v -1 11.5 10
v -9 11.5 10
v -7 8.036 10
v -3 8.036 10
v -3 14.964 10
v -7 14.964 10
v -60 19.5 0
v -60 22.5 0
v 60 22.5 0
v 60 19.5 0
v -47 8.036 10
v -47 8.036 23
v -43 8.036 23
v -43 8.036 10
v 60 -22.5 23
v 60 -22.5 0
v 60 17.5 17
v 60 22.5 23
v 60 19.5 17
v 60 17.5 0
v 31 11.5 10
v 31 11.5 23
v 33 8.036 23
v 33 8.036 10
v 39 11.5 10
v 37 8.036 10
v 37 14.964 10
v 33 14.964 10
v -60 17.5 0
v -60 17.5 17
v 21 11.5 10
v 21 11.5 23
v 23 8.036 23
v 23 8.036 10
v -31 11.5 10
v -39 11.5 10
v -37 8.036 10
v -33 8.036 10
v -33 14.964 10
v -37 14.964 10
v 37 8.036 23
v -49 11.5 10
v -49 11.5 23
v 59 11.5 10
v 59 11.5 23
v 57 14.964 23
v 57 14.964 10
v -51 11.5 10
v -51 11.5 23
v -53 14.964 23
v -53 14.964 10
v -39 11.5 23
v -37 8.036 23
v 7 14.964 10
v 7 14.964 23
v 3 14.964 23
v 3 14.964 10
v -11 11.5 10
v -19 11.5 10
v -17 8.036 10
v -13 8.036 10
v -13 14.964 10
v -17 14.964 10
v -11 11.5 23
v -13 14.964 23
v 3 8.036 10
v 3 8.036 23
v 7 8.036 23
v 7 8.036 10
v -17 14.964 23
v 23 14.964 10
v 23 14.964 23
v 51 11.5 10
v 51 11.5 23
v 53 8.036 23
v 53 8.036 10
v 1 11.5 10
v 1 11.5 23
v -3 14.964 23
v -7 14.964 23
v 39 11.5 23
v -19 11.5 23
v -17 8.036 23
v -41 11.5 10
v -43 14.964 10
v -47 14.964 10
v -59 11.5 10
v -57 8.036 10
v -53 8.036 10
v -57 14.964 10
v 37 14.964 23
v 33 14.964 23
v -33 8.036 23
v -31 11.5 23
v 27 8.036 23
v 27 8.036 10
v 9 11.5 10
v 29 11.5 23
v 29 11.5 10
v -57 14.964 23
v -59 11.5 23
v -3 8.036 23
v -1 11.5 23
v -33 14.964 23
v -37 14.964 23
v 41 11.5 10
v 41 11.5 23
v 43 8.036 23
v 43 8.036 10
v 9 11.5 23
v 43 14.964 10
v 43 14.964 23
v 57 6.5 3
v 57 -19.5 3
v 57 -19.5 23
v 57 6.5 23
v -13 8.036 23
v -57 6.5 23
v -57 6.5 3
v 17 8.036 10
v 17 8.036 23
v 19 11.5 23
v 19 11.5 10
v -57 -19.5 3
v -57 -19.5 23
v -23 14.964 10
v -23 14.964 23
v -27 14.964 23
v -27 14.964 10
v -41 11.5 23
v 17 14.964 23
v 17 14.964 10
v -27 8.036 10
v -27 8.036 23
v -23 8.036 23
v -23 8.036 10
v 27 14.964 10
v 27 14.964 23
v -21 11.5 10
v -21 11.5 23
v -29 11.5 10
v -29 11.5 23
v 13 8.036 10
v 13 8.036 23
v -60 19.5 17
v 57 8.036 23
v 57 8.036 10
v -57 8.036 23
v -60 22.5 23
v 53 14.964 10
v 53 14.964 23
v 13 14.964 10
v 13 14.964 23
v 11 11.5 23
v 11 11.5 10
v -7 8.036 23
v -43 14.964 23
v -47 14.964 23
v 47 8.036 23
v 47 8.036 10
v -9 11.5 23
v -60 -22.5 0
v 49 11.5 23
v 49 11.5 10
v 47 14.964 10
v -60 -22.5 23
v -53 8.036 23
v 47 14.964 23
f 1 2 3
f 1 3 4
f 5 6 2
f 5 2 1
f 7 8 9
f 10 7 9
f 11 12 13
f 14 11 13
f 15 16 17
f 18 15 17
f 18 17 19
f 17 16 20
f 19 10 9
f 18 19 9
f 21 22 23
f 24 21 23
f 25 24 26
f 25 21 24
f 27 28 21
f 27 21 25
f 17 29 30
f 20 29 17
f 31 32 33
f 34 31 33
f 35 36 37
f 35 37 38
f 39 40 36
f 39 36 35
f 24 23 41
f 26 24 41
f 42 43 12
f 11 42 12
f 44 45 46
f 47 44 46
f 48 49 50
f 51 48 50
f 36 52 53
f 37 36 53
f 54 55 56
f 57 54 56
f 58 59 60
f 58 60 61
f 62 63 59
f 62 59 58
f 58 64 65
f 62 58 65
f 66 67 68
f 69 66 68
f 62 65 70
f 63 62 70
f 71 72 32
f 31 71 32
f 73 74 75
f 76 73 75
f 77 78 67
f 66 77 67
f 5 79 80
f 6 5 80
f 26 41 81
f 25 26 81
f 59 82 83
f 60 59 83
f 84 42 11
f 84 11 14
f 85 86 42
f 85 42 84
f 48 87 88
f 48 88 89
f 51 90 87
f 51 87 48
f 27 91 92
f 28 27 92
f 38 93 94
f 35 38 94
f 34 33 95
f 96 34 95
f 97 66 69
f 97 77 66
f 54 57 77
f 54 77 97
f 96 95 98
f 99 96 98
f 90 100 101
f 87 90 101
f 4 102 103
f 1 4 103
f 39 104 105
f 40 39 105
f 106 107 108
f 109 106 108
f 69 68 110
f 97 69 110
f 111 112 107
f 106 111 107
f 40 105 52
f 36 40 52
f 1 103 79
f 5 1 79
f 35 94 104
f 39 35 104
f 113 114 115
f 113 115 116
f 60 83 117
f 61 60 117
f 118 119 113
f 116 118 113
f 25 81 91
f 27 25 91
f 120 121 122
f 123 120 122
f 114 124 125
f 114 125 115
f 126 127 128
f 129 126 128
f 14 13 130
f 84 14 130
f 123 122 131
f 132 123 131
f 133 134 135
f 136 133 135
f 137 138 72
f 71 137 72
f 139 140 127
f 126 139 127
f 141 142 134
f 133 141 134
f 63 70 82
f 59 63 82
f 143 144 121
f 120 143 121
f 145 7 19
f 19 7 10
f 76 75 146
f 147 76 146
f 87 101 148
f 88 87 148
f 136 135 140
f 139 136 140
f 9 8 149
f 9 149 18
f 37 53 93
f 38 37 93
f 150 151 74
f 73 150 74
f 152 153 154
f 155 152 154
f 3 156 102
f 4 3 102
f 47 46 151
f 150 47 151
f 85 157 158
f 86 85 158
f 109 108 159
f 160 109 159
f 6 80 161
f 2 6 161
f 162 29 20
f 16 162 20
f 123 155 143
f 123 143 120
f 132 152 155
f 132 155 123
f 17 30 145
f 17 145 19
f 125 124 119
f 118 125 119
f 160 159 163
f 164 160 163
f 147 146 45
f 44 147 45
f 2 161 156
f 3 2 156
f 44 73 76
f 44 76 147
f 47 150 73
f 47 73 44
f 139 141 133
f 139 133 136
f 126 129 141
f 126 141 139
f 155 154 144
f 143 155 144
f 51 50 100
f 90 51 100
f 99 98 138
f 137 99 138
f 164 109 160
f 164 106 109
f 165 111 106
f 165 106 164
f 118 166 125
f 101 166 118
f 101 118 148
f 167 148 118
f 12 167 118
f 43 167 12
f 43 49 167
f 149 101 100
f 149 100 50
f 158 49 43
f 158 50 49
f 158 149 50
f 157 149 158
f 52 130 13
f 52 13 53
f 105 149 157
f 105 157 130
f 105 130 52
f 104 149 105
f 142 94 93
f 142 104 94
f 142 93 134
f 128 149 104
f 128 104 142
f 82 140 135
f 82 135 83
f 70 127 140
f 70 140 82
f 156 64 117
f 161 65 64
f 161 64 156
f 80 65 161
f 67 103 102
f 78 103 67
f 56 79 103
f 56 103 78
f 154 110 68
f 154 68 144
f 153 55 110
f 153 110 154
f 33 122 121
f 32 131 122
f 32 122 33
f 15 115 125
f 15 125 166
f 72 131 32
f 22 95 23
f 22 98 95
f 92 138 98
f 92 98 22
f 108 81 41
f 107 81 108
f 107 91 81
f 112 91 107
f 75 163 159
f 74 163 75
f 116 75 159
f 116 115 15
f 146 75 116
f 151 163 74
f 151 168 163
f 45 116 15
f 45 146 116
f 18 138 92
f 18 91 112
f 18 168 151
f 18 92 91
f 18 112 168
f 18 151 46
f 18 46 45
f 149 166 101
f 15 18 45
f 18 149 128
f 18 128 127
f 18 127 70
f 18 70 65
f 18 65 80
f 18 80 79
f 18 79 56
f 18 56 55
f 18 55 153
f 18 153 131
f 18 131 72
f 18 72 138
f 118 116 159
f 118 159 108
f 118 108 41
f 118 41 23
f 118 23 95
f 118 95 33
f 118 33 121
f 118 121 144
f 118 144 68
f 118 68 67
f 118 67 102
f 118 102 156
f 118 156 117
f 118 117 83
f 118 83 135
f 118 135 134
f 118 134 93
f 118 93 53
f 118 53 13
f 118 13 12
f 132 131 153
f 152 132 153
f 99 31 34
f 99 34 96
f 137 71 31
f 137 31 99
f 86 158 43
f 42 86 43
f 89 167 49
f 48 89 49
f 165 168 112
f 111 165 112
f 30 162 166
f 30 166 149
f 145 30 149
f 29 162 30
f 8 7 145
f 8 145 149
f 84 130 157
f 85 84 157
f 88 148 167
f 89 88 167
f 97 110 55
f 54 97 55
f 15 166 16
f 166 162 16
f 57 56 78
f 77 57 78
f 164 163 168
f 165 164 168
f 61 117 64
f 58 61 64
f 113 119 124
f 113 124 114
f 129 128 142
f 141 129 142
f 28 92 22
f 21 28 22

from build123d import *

# Parameters (mm, degrees)
F0_W     = 120
F0_H     = 45
F1_DEPTH = 3
F2_W     = 120
F2_H     = 45
F2_W_2   = 114
F2_H_2   = 26
F3_DEPTH = 20
F5_W     = 120
F5_H     = 2
F6_DEPTH = 17
F7_DEPTH = 13


with BuildPart() as f1:
    # F0 (on Top) → F1 (new body)
    with BuildSketch(Plane.XY):
        Rectangle(F0_W, F0_H)
    extrude(amount=F1_DEPTH)

    # F2 (on face) → F3 (join)
    with BuildSketch(Plane.XY.offset(3)):
        Rectangle(F2_W, F2_H)
        with Locations((0, -6.5)):
            Rectangle(F2_W_2, F2_H_2, mode=Mode.SUBTRACT)
    extrude(amount=F3_DEPTH)

    # F5 (on face) → F6 (cut)
    with BuildSketch(Plane(origin=(0, 0, 0), x_dir=(1, 0, 0), z_dir=(0, 0, -1))):
        with Locations((0, -18.5)):
            Rectangle(F5_W, F5_H)
    extrude(amount=-F6_DEPTH, mode=Mode.SUBTRACT)

    # F4 (on face) → F7 (cut)
    with BuildSketch(Plane.XY.offset(23)):
        Polygon((-53, 8.035898), (-51, 11.5), (-53, 14.964102), (-57, 14.964102), (-59, 11.5), (-57, 8.035898), align=None)
        Polygon((-43, 8.035898), (-41, 11.5), (-43, 14.964102), (-47, 14.964102), (-49, 11.5), (-47, 8.035898), align=None)
        Polygon((-33, 8.035898), (-31, 11.5), (-33, 14.964102), (-37, 14.964102), (-39, 11.5), (-37, 8.035898), align=None)
        Polygon((-23, 8.035898), (-21, 11.5), (-23, 14.964102), (-27, 14.964102), (-29, 11.5), (-27, 8.035898), align=None)
        Polygon((-13, 8.035898), (-11, 11.5), (-13, 14.964102), (-17, 14.964102), (-19, 11.5), (-17, 8.035898), align=None)
        Polygon((-3, 8.035898), (-1, 11.5), (-3, 14.964102), (-7, 14.964102), (-9, 11.5), (-7, 8.035898), align=None)
        Polygon((3, 8.035898), (7, 8.035898), (9, 11.5), (7, 14.964102), (3, 14.964102), (1, 11.5), align=None)
        Polygon((11, 11.5), (13, 8.035898), (17, 8.035898), (19, 11.5), (17, 14.964102), (13, 14.964102), align=None)
        Polygon((29, 11.5), (27, 14.964102), (23, 14.964102), (21, 11.5), (23, 8.035898), (27, 8.035898), align=None)
        Polygon((33, 8.035898), (37, 8.035898), (39, 11.5), (37, 14.964102), (33, 14.964102), (31, 11.5), align=None)
        Polygon((43, 8.035898), (47, 8.035898), (49, 11.5), (47, 14.964102), (43, 14.964102), (41, 11.5), align=None)
        Polygon((57, 8.035898), (59, 11.5), (57, 14.964102), (53, 14.964102), (51, 11.5), (53, 8.035898), align=None)
    extrude(amount=-F7_DEPTH, mode=Mode.SUBTRACT)


solid = f1.part
